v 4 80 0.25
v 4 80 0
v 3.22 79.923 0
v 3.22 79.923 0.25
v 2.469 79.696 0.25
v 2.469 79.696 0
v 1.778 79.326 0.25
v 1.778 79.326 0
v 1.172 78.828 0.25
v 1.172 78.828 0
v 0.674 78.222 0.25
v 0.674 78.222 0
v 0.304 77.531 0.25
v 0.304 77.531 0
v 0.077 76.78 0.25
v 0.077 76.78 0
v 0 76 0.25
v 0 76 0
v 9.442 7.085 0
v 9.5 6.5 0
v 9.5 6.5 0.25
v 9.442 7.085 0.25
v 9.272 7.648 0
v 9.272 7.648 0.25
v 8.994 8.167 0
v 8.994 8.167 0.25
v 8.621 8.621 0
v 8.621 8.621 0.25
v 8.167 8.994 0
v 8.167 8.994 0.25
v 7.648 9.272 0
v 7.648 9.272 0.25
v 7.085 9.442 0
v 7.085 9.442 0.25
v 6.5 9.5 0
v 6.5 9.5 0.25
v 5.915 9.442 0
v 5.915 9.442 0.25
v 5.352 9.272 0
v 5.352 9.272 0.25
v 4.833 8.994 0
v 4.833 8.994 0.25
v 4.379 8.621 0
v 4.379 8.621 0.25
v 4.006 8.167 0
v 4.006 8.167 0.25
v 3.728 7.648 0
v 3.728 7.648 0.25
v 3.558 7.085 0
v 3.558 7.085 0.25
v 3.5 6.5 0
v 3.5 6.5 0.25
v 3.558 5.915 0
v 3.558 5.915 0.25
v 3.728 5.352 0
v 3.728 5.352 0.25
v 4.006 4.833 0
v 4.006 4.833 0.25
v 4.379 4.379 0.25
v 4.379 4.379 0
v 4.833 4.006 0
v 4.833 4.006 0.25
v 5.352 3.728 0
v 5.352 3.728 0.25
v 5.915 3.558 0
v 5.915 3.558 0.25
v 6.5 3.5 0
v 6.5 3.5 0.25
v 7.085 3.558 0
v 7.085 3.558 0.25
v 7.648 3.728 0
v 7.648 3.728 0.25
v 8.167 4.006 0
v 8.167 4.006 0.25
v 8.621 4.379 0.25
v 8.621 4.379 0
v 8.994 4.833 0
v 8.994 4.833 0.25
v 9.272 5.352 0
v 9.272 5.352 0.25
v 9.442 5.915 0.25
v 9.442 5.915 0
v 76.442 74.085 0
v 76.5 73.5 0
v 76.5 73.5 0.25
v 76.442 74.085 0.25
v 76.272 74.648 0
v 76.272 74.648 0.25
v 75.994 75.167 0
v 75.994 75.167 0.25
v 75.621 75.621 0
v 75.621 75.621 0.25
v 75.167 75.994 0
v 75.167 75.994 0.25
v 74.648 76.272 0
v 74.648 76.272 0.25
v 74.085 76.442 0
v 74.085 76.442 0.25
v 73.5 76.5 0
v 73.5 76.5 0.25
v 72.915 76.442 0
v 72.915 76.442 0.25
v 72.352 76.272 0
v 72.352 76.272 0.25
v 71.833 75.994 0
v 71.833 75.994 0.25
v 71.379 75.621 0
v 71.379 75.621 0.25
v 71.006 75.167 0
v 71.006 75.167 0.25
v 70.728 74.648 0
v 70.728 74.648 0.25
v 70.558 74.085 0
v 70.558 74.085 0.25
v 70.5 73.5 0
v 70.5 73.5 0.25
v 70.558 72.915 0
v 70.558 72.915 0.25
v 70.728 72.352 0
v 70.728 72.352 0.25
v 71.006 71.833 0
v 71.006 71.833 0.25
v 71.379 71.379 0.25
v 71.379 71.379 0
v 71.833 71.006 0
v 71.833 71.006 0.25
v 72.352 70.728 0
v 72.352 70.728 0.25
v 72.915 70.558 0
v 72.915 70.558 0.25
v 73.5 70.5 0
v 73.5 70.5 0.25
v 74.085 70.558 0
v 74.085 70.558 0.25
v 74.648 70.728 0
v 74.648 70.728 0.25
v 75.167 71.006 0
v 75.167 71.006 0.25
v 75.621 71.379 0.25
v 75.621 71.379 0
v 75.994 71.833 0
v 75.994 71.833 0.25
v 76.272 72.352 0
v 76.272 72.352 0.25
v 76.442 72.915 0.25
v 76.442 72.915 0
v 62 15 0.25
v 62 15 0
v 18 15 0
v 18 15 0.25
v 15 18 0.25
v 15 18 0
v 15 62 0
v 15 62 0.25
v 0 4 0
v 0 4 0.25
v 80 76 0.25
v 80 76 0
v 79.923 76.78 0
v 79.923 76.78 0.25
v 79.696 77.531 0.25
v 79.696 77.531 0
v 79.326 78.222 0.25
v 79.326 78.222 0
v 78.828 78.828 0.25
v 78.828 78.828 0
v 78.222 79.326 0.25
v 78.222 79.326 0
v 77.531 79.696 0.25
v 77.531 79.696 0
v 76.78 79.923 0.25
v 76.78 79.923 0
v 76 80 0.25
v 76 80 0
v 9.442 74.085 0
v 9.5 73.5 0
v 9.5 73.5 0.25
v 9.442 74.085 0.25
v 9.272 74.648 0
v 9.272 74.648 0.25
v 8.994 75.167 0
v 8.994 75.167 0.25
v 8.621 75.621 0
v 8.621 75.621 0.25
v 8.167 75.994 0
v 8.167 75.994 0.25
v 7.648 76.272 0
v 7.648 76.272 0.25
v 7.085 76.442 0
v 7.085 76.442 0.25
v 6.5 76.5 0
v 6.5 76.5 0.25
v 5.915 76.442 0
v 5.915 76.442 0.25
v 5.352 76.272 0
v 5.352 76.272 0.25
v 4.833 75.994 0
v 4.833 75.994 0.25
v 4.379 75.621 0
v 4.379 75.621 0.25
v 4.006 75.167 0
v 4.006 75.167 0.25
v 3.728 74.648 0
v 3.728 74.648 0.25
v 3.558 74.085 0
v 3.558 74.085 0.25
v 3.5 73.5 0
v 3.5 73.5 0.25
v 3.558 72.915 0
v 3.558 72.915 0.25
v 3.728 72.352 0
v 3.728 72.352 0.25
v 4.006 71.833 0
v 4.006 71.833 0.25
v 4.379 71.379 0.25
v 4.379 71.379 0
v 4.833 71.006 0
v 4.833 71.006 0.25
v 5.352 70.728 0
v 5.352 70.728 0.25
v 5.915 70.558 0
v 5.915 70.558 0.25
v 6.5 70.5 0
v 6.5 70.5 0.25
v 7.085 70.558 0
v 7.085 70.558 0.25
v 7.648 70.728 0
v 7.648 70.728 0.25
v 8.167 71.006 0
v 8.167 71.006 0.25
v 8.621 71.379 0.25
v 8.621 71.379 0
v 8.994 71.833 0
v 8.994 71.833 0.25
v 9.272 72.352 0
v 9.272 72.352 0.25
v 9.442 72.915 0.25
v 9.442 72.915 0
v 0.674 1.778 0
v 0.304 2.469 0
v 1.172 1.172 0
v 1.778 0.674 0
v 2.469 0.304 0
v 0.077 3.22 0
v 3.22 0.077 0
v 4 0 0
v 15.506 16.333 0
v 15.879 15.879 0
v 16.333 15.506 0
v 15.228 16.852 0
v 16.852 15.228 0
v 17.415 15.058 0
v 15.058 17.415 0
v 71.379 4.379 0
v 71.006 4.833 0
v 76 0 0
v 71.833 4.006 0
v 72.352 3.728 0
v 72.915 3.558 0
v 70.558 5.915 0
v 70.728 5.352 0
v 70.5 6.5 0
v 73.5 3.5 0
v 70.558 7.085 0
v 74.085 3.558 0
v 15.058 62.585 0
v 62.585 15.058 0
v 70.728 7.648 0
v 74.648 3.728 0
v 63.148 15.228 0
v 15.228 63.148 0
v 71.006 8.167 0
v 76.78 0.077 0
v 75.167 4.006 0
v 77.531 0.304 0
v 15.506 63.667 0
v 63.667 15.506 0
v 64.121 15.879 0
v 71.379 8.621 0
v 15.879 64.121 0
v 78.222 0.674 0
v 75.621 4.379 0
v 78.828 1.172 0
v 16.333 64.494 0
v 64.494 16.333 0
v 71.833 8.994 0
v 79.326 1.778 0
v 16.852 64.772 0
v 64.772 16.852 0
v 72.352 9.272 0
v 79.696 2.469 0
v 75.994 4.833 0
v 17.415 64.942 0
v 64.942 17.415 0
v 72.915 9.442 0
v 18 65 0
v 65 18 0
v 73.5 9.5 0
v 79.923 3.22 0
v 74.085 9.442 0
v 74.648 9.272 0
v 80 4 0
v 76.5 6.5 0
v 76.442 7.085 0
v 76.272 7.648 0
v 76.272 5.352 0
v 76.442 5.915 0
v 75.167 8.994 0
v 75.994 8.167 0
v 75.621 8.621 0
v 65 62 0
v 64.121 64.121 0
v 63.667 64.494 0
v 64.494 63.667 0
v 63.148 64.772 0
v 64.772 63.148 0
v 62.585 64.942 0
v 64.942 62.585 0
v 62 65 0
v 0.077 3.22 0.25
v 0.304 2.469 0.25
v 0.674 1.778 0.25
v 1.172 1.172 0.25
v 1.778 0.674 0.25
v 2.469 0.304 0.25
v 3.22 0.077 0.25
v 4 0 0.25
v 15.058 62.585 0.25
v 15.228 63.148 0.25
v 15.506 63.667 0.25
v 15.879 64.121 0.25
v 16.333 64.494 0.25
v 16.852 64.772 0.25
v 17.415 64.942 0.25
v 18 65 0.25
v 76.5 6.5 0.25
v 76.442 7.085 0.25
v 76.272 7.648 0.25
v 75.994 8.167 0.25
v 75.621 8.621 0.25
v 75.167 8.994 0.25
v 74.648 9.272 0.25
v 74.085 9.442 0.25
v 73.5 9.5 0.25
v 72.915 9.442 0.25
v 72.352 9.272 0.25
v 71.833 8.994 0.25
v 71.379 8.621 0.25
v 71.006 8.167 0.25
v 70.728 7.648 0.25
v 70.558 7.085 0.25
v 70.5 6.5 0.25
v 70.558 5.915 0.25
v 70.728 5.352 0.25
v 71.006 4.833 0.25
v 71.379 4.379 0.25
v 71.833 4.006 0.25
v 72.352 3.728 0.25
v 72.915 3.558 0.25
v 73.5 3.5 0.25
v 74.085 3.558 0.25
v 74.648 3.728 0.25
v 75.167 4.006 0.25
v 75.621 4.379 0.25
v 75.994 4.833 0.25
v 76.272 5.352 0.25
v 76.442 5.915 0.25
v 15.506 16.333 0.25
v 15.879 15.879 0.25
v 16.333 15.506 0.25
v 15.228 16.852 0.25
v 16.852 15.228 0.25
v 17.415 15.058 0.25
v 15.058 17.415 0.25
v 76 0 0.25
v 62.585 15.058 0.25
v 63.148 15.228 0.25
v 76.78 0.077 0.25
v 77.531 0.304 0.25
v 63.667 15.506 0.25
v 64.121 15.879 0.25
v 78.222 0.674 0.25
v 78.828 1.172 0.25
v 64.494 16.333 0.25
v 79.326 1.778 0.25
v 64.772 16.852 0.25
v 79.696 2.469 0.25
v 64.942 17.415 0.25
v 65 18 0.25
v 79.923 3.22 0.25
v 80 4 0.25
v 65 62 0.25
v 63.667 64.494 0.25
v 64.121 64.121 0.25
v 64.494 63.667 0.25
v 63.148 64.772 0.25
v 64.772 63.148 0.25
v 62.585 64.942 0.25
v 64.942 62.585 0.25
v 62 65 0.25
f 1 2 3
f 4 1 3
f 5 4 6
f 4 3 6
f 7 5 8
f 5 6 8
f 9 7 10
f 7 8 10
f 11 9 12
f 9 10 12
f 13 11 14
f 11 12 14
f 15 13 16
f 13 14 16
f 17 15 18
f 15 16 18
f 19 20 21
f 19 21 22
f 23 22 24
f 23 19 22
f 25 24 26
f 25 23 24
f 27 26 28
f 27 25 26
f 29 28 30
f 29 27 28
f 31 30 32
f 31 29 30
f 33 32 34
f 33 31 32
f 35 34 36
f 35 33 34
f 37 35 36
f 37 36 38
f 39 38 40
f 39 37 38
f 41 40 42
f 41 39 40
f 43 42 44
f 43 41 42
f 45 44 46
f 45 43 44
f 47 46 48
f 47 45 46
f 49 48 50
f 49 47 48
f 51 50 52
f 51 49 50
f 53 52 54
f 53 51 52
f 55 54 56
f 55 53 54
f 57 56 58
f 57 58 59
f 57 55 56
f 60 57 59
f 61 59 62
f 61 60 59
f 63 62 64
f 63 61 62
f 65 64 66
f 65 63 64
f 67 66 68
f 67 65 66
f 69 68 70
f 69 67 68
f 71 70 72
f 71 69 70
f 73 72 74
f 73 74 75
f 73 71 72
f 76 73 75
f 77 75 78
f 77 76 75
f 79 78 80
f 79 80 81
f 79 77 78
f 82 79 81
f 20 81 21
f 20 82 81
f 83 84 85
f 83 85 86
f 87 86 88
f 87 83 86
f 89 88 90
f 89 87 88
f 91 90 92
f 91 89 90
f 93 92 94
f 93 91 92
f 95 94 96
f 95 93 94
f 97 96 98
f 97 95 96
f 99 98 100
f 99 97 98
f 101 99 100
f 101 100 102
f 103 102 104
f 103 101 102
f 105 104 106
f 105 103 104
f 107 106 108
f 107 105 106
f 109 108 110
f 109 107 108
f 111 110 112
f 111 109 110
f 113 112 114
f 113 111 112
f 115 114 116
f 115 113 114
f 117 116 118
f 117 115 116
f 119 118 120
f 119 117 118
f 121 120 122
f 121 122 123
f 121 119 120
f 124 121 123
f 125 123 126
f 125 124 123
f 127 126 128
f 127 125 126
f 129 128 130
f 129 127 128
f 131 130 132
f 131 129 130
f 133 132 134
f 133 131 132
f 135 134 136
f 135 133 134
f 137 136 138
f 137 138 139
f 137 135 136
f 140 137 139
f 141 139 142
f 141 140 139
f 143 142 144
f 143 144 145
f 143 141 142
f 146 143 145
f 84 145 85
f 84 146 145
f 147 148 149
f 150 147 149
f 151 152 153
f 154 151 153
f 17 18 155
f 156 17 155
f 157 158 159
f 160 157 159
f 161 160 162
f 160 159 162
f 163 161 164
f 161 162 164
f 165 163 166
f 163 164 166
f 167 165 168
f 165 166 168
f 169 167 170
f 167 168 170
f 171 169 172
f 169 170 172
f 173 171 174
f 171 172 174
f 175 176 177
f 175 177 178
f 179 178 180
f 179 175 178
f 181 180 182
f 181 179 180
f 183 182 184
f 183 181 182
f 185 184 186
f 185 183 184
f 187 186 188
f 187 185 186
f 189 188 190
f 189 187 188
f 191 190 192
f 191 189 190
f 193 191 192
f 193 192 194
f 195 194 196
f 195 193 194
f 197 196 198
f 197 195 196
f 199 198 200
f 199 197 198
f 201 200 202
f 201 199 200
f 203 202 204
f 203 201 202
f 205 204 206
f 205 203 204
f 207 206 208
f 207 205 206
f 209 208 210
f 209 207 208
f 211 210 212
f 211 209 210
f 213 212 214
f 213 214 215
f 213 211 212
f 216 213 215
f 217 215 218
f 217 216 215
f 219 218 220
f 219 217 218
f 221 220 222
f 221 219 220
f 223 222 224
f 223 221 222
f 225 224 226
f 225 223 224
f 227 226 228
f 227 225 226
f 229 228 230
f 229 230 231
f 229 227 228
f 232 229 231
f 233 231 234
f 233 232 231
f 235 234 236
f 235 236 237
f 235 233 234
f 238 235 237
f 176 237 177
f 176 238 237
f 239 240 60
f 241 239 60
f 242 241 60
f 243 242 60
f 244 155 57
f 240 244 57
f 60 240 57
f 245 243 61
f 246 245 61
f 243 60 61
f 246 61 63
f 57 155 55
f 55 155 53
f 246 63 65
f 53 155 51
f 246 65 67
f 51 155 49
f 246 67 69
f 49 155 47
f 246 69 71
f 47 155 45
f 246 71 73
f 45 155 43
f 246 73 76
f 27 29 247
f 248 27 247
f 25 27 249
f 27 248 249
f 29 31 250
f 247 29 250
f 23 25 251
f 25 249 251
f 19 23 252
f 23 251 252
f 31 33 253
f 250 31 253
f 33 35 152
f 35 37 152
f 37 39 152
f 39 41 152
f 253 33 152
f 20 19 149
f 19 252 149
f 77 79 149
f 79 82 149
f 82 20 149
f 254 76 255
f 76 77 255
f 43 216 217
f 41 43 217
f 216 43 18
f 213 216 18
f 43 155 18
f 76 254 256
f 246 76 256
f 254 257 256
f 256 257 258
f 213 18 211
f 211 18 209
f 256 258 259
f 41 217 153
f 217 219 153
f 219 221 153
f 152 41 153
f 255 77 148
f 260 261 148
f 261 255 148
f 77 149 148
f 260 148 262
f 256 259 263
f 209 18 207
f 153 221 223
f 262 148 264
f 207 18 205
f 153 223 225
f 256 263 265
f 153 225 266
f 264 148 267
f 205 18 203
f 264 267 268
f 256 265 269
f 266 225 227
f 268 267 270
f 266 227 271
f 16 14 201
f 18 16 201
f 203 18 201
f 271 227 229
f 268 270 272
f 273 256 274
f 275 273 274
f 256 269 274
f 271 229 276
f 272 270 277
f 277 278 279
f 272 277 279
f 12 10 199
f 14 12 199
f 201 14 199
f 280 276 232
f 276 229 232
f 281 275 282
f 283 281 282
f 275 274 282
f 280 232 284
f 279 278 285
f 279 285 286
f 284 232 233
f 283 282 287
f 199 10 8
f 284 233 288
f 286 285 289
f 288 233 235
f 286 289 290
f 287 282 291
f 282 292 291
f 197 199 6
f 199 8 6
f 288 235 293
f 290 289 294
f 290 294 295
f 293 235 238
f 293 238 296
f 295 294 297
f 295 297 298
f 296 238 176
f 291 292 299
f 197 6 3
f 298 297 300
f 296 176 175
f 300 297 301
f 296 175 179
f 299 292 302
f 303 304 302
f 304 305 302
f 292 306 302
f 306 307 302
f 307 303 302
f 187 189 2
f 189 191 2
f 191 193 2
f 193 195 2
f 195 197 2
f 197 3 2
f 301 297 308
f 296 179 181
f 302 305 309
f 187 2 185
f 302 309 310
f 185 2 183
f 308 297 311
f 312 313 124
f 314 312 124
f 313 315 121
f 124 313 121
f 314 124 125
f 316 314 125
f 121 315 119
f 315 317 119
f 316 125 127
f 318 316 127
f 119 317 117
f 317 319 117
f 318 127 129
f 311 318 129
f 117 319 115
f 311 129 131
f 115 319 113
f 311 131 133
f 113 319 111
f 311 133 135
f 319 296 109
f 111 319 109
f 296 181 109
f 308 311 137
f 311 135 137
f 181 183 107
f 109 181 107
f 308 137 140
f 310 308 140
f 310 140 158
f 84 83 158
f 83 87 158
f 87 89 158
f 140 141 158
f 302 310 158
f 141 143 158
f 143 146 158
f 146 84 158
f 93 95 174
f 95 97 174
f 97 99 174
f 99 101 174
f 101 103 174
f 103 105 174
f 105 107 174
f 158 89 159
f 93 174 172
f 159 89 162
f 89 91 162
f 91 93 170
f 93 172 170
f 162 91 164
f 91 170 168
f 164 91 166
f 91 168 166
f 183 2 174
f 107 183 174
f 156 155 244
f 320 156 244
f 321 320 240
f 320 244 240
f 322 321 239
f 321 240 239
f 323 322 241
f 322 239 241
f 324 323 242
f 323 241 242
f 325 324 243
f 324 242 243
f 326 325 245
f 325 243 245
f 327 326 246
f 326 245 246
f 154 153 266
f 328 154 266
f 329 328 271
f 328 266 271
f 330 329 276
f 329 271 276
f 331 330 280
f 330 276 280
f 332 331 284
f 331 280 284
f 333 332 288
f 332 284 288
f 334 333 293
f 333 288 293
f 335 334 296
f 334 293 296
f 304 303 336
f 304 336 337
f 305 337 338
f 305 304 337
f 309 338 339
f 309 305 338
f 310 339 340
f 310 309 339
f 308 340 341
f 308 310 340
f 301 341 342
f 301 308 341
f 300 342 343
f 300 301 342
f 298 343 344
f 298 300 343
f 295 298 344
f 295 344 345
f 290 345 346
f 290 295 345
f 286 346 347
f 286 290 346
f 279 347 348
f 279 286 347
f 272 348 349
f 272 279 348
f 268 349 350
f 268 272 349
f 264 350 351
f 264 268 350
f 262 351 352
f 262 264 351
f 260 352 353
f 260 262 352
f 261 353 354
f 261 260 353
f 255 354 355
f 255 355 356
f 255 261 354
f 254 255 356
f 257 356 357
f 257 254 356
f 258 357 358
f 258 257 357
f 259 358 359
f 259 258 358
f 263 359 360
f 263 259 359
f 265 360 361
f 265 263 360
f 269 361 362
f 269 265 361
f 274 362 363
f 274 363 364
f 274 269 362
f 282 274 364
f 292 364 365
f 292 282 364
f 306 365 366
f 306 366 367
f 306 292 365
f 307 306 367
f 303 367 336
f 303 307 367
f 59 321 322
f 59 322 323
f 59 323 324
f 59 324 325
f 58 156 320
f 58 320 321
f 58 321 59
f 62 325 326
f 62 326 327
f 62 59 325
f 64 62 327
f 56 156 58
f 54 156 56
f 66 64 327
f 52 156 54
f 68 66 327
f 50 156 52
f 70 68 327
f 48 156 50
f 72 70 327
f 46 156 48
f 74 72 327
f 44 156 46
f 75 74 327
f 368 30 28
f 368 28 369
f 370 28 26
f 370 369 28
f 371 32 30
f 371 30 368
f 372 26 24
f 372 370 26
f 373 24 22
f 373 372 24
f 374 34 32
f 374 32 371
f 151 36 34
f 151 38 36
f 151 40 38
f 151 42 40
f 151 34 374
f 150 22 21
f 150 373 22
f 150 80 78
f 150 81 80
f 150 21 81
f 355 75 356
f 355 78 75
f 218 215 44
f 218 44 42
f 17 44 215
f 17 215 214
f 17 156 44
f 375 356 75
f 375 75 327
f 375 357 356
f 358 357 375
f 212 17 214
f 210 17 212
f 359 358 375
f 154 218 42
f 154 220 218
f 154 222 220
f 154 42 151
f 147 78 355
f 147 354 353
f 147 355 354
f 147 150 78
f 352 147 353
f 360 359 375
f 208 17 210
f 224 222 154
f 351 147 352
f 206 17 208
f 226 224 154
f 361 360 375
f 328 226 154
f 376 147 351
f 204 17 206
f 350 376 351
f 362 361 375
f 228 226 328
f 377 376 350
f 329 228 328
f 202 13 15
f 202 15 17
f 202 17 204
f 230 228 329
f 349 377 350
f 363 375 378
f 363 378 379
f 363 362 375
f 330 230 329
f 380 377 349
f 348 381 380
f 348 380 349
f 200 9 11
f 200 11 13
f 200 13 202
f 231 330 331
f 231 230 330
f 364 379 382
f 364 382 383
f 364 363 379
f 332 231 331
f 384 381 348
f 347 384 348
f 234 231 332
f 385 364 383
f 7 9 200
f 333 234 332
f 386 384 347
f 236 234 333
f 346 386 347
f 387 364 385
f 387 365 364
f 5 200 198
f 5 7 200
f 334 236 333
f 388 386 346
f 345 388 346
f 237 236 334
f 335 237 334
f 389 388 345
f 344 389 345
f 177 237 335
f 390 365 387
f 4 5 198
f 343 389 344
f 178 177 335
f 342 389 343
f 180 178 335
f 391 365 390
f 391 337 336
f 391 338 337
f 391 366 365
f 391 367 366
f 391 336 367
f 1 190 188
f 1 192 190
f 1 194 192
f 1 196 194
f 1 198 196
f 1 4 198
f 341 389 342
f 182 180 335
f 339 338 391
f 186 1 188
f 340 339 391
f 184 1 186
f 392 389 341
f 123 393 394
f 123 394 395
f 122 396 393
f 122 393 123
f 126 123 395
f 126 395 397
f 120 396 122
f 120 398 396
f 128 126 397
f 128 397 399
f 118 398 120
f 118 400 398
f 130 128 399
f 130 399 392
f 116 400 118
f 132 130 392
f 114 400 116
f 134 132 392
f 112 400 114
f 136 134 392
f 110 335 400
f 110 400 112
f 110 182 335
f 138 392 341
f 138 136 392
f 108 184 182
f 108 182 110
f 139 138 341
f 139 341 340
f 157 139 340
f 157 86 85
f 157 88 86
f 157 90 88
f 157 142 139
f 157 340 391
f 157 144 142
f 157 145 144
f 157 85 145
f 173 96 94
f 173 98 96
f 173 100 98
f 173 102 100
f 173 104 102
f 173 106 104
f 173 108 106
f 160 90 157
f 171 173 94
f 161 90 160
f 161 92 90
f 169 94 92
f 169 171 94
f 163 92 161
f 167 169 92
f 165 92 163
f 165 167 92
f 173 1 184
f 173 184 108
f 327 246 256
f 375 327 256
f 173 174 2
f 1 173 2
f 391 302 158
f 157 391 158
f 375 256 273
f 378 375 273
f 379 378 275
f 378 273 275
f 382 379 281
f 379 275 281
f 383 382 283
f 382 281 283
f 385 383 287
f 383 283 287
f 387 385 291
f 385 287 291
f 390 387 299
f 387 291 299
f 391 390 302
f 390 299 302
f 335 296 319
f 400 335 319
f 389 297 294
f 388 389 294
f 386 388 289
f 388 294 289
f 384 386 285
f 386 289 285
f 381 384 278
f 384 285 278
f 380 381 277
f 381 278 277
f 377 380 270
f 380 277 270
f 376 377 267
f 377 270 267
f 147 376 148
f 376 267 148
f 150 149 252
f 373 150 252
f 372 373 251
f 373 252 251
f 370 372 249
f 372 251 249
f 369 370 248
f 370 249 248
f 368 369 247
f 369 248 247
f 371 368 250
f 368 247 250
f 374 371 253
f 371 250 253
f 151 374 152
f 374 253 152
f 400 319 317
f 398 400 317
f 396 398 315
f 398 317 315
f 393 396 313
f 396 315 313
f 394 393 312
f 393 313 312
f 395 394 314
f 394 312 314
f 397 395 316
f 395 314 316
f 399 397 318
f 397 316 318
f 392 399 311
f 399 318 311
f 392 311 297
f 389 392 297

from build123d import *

# Parameters (mm, degrees)
F0_R     = 3
F1_DEPTH = 0.25


with BuildPart() as f1:
    # F0 (on Top) → F1 (new body)
    with BuildSketch(Plane.XY):
        with BuildLine():
            ThreePointArc((0, 4), (1.171573, 1.171573), (4, 0))
            Line((4, 0), (76, 0))
            ThreePointArc((76, 0), (78.828427, 1.171573), (80, 4))
            Line((80, 4), (80, 76))
            ThreePointArc((80, 76), (78.828427, 78.828427), (76, 80))
            Line((76, 80), (4, 80))
            ThreePointArc((4, 80), (1.171573, 78.828427), (0, 76))
            Line((0, 76), (0, 4))
        make_face()
        with Locations((6.5, 6.5)):
            Circle(F0_R, mode=Mode.SUBTRACT)
        with Locations((73.5, 6.5)):
            Circle(F0_R, mode=Mode.SUBTRACT)
        with BuildLine():
            ThreePointArc((15, 62), (15.87868, 64.12132), (18, 65))
            Line((18, 65), (62, 65))
            ThreePointArc((62, 65), (64.12132, 64.12132), (65, 62))
            Line((65, 62), (65, 18))
            ThreePointArc((65, 18), (64.12132, 15.87868), (62, 15))
            Line((62, 15), (18, 15))
            ThreePointArc((18, 15), (15.87868, 15.87868), (15, 18))
            Line((15, 18), (15, 62))
        make_face(mode=Mode.SUBTRACT)
        with Locations((6.5, 73.5)):
            Circle(F0_R, mode=Mode.SUBTRACT)
        with Locations((73.5, 73.5)):
            Circle(F0_R, mode=Mode.SUBTRACT)
    extrude(amount=F1_DEPTH)


solid = f1.part
